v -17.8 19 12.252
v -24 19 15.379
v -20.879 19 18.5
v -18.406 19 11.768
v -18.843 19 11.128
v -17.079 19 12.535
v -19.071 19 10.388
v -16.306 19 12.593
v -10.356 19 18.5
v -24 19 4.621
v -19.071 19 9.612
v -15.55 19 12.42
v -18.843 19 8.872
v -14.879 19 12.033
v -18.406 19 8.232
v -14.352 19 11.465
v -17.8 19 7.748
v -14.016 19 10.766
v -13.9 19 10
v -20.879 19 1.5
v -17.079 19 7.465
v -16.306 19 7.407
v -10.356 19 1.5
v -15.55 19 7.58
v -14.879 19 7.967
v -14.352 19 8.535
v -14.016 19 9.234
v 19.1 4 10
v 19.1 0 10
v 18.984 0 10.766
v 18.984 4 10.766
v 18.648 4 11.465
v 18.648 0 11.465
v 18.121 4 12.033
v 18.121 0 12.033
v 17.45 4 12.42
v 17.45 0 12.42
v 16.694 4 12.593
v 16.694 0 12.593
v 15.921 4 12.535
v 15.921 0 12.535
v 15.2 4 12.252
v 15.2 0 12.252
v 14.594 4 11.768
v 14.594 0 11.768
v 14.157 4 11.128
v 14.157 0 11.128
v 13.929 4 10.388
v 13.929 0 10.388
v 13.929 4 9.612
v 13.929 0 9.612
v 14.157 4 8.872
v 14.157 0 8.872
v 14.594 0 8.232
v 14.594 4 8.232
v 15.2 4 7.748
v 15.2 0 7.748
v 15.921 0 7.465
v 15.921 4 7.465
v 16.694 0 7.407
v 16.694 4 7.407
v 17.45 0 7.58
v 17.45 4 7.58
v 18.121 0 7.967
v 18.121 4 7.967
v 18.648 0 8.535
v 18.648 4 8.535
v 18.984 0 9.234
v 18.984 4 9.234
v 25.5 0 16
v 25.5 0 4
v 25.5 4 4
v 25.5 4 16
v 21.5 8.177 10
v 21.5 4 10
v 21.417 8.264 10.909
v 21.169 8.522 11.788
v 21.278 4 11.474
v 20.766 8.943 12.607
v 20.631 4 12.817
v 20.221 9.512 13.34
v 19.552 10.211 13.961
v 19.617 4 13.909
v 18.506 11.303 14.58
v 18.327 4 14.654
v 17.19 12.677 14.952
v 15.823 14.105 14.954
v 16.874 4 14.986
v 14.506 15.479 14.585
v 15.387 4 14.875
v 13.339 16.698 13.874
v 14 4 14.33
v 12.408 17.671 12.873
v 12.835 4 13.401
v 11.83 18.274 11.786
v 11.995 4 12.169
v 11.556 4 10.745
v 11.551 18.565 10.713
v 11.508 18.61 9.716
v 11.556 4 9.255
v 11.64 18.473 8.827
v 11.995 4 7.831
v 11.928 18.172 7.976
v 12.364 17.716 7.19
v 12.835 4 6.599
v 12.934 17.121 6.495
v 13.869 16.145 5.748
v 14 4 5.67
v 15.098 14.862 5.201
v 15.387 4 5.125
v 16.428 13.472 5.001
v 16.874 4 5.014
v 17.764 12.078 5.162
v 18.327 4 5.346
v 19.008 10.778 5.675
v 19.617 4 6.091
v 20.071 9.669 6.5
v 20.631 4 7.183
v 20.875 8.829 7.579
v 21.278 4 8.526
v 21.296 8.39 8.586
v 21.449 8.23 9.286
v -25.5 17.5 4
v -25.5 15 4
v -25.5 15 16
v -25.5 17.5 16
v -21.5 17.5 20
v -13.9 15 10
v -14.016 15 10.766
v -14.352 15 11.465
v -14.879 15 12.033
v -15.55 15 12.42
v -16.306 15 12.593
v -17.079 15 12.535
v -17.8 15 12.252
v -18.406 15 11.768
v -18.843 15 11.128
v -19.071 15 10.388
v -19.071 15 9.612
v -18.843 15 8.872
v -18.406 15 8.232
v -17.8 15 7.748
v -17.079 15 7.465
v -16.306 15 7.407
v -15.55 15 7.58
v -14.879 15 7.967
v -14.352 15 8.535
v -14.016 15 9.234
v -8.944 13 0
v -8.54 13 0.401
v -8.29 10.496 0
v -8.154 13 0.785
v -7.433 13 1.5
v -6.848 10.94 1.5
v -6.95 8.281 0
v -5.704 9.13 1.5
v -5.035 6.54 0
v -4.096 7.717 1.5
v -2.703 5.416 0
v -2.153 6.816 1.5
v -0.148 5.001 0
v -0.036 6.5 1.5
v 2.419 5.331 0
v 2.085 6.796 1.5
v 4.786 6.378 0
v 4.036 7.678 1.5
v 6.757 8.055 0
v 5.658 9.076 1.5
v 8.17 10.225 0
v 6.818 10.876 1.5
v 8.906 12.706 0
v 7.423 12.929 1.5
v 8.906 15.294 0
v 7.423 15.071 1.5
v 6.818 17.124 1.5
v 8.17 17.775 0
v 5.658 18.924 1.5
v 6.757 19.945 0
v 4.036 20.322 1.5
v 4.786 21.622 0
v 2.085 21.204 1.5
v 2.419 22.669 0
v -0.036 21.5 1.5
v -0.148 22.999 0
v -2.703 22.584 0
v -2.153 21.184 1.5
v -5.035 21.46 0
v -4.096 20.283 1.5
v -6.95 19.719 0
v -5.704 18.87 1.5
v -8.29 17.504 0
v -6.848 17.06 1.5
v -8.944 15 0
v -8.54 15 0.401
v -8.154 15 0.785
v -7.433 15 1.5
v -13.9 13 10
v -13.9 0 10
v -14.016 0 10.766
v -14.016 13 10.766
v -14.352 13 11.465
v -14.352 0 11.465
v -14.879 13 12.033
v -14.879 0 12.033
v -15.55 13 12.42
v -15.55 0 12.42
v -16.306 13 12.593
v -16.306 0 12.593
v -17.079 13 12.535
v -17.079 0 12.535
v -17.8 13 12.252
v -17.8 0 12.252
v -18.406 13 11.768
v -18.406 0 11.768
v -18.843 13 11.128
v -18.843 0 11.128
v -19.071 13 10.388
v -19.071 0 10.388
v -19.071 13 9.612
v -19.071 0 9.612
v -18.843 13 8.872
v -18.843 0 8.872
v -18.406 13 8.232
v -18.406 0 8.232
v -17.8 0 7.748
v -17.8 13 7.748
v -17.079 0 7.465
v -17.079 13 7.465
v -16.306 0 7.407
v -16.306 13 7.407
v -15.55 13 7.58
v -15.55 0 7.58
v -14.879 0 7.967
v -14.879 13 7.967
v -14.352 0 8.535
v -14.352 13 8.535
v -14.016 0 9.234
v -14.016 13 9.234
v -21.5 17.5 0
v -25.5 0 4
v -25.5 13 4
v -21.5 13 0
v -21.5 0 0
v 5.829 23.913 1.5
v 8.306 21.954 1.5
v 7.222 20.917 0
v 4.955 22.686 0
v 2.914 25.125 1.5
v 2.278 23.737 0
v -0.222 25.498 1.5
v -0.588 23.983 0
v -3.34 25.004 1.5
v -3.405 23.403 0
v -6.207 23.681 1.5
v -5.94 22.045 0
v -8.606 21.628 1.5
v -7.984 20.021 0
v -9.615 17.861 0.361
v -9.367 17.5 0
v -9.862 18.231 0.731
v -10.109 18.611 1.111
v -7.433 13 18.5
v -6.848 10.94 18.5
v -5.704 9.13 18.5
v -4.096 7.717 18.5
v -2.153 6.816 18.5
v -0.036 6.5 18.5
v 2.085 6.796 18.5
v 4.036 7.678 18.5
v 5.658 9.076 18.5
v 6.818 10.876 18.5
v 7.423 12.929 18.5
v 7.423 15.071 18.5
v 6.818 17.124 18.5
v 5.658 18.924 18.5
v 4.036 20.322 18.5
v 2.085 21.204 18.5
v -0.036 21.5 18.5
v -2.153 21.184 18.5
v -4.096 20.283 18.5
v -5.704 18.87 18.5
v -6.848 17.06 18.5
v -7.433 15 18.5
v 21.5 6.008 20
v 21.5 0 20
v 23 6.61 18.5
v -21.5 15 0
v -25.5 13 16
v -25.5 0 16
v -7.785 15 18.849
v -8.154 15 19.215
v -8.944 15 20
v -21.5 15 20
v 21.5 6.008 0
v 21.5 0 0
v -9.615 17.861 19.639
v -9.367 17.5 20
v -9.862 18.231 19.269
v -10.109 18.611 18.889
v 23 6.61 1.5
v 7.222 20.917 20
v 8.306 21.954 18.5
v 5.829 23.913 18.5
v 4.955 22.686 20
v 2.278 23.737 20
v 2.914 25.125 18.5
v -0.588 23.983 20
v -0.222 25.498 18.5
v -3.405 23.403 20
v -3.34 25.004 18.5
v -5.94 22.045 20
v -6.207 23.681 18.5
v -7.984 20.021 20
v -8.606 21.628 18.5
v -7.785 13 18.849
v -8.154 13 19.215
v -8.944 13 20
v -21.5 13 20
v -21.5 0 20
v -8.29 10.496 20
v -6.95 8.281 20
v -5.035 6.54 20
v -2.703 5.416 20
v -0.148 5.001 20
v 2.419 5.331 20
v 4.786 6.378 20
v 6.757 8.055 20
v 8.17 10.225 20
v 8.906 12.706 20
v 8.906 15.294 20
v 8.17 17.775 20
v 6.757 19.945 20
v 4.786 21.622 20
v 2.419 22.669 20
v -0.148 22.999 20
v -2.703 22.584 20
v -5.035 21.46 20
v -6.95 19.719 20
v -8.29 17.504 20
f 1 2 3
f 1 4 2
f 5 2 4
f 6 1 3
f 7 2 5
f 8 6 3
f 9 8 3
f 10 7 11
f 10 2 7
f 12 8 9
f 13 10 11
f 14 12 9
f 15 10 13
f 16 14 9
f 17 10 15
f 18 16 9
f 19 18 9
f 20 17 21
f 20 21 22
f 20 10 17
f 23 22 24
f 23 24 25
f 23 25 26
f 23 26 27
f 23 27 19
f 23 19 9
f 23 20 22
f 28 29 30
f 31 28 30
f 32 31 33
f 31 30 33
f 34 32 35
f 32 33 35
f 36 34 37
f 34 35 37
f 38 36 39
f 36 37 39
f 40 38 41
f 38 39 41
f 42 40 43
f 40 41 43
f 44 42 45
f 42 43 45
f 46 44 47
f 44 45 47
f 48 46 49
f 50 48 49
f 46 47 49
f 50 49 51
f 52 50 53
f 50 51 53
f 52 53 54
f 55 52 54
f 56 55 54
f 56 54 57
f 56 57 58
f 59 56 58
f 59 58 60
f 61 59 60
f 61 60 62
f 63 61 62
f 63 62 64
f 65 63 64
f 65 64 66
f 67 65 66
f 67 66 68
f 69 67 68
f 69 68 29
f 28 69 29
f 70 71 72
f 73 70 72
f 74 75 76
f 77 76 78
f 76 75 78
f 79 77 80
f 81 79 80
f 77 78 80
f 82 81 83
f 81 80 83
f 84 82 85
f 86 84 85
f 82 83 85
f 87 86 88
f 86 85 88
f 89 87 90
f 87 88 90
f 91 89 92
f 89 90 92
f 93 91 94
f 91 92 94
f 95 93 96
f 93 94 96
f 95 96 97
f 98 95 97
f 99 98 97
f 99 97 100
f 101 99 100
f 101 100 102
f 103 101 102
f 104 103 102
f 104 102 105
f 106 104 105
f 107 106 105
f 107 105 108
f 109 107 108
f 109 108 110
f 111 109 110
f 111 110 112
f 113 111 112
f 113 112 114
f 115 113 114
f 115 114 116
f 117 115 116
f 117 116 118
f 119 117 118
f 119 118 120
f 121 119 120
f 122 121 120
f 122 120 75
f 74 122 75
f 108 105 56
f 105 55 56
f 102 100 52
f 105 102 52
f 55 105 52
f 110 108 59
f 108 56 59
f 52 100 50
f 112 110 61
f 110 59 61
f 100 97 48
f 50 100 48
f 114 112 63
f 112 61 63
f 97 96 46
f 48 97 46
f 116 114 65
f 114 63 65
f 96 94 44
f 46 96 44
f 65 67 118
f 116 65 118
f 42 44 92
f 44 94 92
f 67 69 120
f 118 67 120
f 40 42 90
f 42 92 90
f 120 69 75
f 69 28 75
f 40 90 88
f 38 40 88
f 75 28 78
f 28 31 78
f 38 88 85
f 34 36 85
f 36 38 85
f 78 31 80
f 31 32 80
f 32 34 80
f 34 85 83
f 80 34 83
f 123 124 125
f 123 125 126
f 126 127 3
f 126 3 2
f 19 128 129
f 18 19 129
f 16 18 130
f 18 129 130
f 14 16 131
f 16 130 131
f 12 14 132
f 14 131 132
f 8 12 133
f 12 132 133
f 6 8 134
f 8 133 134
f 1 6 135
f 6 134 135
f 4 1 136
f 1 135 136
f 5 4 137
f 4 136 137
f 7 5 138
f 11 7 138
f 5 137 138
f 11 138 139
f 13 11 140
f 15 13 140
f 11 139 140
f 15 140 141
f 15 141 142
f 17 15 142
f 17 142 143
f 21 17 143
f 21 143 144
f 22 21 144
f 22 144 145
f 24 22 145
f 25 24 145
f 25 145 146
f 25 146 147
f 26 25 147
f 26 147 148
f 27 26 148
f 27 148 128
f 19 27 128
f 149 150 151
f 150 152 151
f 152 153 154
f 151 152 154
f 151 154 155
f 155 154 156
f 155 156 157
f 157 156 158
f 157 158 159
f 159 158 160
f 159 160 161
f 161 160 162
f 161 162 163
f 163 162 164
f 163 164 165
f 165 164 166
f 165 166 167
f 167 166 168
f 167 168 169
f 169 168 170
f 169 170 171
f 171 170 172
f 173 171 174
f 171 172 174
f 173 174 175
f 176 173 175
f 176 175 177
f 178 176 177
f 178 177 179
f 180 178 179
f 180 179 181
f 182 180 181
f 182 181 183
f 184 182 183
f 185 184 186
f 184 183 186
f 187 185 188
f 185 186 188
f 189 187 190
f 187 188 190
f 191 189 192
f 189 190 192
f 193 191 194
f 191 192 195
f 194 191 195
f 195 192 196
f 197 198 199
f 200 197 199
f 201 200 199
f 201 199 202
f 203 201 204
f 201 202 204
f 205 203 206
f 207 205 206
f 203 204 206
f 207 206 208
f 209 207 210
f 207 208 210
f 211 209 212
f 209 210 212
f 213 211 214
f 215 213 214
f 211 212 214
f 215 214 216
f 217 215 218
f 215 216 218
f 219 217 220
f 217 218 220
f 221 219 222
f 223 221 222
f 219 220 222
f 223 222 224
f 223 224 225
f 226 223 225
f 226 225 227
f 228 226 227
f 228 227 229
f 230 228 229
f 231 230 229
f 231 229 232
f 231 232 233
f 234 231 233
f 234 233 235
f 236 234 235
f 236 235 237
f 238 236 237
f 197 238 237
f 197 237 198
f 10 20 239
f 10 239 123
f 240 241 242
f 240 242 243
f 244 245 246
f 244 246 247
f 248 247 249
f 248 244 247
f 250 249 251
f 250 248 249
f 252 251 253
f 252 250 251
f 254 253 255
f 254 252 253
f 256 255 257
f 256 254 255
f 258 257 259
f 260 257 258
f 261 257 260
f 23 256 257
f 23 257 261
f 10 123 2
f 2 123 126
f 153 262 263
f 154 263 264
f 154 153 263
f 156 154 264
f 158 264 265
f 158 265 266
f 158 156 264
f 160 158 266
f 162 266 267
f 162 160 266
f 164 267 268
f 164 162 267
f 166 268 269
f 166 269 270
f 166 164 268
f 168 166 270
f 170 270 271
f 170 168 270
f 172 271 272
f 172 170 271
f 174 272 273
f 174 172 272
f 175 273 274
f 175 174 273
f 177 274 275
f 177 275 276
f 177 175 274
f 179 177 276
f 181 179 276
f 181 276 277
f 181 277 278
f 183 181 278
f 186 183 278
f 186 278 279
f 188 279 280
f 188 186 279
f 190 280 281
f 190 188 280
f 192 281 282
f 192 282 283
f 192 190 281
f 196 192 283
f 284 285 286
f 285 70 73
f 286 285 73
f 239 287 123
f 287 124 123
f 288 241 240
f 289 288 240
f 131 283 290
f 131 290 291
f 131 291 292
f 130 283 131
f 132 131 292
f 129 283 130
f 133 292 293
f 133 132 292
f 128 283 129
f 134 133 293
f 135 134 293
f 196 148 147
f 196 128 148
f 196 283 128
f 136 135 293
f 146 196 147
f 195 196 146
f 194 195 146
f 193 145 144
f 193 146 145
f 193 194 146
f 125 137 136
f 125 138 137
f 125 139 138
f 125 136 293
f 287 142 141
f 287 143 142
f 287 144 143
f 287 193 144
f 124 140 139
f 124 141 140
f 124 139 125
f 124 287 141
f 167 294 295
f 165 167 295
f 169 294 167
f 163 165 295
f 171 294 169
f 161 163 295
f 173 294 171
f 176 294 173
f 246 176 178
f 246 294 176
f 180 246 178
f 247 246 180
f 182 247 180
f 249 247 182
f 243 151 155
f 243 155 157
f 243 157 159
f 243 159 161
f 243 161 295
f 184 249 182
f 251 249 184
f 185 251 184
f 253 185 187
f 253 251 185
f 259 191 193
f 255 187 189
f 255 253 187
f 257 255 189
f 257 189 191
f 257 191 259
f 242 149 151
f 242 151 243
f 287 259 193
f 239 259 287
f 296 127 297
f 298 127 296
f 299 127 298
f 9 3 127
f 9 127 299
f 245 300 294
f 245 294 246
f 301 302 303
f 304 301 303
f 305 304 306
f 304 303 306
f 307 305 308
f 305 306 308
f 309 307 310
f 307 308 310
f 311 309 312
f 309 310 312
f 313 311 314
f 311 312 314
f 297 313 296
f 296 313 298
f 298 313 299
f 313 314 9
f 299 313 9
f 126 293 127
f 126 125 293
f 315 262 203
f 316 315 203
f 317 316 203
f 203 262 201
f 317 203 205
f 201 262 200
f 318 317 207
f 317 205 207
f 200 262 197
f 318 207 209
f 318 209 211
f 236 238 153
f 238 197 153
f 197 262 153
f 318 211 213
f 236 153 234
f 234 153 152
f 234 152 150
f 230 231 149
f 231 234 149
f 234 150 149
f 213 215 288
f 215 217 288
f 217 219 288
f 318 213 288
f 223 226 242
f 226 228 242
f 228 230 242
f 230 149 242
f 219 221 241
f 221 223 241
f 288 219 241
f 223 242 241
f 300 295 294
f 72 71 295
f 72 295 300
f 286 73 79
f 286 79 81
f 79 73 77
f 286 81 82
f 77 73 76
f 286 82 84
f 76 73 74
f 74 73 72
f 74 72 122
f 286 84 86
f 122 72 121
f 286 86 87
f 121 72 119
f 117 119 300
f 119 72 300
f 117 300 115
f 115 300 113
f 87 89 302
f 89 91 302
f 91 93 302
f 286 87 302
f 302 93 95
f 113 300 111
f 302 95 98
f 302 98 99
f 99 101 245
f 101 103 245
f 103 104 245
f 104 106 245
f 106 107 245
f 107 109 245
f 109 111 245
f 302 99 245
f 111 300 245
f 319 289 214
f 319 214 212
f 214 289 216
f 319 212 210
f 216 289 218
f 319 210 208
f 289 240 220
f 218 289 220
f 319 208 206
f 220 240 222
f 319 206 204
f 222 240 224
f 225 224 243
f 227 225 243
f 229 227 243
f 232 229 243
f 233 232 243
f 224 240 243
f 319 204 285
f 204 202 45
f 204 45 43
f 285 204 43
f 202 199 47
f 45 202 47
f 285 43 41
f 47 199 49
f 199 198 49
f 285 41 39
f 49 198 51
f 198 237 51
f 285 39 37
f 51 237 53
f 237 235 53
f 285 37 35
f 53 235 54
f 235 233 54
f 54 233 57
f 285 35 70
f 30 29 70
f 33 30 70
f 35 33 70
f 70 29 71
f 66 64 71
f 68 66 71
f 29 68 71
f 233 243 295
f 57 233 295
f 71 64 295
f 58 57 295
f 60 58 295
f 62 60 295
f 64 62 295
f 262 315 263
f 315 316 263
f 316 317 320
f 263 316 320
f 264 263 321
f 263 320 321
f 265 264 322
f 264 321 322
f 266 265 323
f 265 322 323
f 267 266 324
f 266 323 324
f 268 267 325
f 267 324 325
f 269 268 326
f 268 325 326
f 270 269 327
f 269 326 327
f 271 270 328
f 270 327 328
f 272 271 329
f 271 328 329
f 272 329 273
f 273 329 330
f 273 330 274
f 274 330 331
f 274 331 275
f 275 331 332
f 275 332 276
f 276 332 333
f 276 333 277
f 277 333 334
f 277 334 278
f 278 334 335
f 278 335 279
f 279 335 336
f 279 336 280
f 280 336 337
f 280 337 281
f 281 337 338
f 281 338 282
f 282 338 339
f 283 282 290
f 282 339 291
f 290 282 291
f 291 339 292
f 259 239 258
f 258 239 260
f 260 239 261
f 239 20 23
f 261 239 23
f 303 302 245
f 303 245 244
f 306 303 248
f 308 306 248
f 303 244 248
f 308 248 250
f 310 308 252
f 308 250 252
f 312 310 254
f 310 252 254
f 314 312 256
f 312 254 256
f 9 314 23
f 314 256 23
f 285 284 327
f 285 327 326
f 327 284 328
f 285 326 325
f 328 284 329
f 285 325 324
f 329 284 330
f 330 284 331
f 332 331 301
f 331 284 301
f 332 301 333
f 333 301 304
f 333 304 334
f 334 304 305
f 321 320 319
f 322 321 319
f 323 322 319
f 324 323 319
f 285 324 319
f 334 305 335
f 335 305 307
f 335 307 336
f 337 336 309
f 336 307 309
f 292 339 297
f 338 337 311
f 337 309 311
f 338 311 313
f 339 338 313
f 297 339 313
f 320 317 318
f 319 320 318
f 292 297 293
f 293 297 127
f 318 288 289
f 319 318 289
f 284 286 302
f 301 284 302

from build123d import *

# Parameters (mm, degrees)
PAD_DEPTH       = 20
SKETCH001_R     = 2.6
POCKET_DEPTH    = 25.501
SKETCH002_R     = 5
POCKET001_DEPTH = 21.501
CHAMFER_SIZE    = 4
CHAMFER001_SIZE = 1.5


with BuildPart() as part:
    # Sketch → Pad (new body)
    with BuildSketch(Plane.XY):
        with BuildLine():
            ThreePointArc((-7.433034, 13), (7.5, 14), (-7.433034, 15))
            Line((-7.433034, 15), (-25.5, 15))
            Line((-25.5, 15), (-25.5, 19))
            Line((-25.5, 19), (-10.356158, 19))
            ThreePointArc((8.305538, 21.954121), (-1.798046, 25.358566), (-10.356158, 19))
            Line((25.5, 4), (8.305538, 21.954121))
            Line((25.5, 0), (25.5, 4))
            Line((-25.5, 0), (25.5, 0))
            Line((-25.5, 13), (-25.5, 0))
            Line((-7.433034, 13), (-25.5, 13))
        make_face()
    extrude(amount=PAD_DEPTH)

    # Sketch001 → Pocket (cut, through all)
    with BuildSketch(Plane.XZ):
        with Locations((-16.5, 10)):
            Circle(SKETCH001_R)
        with Locations((16.5, 10)):
            Circle(SKETCH001_R)
    extrude(amount=-POCKET_DEPTH, mode=Mode.SUBTRACT)

    # Sketch002 (on DatumPlane) → Pocket001 (cut, through all)
    with BuildSketch(Plane.XZ.offset(-4)):
        with Locations((16.5, 10)):
            Circle(SKETCH002_R)
    extrude(amount=-POCKET001_DEPTH, mode=Mode.SUBTRACT)

    # Chamfer
    chamfer_edges = [part.edges().sort_by_distance(p)[0] for p in [
        (-25.5, 17, 20),
        (-25.5, 6.5, 20),
        (-25.5, 17, 0),
        (-25.5, 6.5, 0),
        (25.5, 2, 20),
        (25.5, 2, 0),
    ]]
    chamfer(chamfer_edges, length=CHAMFER_SIZE)

    # Chamfer001
    chamfer001_edges = [part.edges().sort_by_distance(p)[0] for p in [
        (7.5, 14, 20),
        (7.5, 14, 0),
        (-1.798046, 25.358566, 20),
        (-15.928079, 19, 20),
        (-23.5, 19, 18),
        (-25.5, 19, 10),
        (-23.5, 19, 2),
        (-15.928079, 19, 0),
        (-1.798046, 25.358566, 0),
        (14.902769, 15.065421, 20),
        (14.902769, 15.065421, 0),
    ]]
    chamfer(chamfer001_edges, length=CHAMFER001_SIZE)


solid = part.part
